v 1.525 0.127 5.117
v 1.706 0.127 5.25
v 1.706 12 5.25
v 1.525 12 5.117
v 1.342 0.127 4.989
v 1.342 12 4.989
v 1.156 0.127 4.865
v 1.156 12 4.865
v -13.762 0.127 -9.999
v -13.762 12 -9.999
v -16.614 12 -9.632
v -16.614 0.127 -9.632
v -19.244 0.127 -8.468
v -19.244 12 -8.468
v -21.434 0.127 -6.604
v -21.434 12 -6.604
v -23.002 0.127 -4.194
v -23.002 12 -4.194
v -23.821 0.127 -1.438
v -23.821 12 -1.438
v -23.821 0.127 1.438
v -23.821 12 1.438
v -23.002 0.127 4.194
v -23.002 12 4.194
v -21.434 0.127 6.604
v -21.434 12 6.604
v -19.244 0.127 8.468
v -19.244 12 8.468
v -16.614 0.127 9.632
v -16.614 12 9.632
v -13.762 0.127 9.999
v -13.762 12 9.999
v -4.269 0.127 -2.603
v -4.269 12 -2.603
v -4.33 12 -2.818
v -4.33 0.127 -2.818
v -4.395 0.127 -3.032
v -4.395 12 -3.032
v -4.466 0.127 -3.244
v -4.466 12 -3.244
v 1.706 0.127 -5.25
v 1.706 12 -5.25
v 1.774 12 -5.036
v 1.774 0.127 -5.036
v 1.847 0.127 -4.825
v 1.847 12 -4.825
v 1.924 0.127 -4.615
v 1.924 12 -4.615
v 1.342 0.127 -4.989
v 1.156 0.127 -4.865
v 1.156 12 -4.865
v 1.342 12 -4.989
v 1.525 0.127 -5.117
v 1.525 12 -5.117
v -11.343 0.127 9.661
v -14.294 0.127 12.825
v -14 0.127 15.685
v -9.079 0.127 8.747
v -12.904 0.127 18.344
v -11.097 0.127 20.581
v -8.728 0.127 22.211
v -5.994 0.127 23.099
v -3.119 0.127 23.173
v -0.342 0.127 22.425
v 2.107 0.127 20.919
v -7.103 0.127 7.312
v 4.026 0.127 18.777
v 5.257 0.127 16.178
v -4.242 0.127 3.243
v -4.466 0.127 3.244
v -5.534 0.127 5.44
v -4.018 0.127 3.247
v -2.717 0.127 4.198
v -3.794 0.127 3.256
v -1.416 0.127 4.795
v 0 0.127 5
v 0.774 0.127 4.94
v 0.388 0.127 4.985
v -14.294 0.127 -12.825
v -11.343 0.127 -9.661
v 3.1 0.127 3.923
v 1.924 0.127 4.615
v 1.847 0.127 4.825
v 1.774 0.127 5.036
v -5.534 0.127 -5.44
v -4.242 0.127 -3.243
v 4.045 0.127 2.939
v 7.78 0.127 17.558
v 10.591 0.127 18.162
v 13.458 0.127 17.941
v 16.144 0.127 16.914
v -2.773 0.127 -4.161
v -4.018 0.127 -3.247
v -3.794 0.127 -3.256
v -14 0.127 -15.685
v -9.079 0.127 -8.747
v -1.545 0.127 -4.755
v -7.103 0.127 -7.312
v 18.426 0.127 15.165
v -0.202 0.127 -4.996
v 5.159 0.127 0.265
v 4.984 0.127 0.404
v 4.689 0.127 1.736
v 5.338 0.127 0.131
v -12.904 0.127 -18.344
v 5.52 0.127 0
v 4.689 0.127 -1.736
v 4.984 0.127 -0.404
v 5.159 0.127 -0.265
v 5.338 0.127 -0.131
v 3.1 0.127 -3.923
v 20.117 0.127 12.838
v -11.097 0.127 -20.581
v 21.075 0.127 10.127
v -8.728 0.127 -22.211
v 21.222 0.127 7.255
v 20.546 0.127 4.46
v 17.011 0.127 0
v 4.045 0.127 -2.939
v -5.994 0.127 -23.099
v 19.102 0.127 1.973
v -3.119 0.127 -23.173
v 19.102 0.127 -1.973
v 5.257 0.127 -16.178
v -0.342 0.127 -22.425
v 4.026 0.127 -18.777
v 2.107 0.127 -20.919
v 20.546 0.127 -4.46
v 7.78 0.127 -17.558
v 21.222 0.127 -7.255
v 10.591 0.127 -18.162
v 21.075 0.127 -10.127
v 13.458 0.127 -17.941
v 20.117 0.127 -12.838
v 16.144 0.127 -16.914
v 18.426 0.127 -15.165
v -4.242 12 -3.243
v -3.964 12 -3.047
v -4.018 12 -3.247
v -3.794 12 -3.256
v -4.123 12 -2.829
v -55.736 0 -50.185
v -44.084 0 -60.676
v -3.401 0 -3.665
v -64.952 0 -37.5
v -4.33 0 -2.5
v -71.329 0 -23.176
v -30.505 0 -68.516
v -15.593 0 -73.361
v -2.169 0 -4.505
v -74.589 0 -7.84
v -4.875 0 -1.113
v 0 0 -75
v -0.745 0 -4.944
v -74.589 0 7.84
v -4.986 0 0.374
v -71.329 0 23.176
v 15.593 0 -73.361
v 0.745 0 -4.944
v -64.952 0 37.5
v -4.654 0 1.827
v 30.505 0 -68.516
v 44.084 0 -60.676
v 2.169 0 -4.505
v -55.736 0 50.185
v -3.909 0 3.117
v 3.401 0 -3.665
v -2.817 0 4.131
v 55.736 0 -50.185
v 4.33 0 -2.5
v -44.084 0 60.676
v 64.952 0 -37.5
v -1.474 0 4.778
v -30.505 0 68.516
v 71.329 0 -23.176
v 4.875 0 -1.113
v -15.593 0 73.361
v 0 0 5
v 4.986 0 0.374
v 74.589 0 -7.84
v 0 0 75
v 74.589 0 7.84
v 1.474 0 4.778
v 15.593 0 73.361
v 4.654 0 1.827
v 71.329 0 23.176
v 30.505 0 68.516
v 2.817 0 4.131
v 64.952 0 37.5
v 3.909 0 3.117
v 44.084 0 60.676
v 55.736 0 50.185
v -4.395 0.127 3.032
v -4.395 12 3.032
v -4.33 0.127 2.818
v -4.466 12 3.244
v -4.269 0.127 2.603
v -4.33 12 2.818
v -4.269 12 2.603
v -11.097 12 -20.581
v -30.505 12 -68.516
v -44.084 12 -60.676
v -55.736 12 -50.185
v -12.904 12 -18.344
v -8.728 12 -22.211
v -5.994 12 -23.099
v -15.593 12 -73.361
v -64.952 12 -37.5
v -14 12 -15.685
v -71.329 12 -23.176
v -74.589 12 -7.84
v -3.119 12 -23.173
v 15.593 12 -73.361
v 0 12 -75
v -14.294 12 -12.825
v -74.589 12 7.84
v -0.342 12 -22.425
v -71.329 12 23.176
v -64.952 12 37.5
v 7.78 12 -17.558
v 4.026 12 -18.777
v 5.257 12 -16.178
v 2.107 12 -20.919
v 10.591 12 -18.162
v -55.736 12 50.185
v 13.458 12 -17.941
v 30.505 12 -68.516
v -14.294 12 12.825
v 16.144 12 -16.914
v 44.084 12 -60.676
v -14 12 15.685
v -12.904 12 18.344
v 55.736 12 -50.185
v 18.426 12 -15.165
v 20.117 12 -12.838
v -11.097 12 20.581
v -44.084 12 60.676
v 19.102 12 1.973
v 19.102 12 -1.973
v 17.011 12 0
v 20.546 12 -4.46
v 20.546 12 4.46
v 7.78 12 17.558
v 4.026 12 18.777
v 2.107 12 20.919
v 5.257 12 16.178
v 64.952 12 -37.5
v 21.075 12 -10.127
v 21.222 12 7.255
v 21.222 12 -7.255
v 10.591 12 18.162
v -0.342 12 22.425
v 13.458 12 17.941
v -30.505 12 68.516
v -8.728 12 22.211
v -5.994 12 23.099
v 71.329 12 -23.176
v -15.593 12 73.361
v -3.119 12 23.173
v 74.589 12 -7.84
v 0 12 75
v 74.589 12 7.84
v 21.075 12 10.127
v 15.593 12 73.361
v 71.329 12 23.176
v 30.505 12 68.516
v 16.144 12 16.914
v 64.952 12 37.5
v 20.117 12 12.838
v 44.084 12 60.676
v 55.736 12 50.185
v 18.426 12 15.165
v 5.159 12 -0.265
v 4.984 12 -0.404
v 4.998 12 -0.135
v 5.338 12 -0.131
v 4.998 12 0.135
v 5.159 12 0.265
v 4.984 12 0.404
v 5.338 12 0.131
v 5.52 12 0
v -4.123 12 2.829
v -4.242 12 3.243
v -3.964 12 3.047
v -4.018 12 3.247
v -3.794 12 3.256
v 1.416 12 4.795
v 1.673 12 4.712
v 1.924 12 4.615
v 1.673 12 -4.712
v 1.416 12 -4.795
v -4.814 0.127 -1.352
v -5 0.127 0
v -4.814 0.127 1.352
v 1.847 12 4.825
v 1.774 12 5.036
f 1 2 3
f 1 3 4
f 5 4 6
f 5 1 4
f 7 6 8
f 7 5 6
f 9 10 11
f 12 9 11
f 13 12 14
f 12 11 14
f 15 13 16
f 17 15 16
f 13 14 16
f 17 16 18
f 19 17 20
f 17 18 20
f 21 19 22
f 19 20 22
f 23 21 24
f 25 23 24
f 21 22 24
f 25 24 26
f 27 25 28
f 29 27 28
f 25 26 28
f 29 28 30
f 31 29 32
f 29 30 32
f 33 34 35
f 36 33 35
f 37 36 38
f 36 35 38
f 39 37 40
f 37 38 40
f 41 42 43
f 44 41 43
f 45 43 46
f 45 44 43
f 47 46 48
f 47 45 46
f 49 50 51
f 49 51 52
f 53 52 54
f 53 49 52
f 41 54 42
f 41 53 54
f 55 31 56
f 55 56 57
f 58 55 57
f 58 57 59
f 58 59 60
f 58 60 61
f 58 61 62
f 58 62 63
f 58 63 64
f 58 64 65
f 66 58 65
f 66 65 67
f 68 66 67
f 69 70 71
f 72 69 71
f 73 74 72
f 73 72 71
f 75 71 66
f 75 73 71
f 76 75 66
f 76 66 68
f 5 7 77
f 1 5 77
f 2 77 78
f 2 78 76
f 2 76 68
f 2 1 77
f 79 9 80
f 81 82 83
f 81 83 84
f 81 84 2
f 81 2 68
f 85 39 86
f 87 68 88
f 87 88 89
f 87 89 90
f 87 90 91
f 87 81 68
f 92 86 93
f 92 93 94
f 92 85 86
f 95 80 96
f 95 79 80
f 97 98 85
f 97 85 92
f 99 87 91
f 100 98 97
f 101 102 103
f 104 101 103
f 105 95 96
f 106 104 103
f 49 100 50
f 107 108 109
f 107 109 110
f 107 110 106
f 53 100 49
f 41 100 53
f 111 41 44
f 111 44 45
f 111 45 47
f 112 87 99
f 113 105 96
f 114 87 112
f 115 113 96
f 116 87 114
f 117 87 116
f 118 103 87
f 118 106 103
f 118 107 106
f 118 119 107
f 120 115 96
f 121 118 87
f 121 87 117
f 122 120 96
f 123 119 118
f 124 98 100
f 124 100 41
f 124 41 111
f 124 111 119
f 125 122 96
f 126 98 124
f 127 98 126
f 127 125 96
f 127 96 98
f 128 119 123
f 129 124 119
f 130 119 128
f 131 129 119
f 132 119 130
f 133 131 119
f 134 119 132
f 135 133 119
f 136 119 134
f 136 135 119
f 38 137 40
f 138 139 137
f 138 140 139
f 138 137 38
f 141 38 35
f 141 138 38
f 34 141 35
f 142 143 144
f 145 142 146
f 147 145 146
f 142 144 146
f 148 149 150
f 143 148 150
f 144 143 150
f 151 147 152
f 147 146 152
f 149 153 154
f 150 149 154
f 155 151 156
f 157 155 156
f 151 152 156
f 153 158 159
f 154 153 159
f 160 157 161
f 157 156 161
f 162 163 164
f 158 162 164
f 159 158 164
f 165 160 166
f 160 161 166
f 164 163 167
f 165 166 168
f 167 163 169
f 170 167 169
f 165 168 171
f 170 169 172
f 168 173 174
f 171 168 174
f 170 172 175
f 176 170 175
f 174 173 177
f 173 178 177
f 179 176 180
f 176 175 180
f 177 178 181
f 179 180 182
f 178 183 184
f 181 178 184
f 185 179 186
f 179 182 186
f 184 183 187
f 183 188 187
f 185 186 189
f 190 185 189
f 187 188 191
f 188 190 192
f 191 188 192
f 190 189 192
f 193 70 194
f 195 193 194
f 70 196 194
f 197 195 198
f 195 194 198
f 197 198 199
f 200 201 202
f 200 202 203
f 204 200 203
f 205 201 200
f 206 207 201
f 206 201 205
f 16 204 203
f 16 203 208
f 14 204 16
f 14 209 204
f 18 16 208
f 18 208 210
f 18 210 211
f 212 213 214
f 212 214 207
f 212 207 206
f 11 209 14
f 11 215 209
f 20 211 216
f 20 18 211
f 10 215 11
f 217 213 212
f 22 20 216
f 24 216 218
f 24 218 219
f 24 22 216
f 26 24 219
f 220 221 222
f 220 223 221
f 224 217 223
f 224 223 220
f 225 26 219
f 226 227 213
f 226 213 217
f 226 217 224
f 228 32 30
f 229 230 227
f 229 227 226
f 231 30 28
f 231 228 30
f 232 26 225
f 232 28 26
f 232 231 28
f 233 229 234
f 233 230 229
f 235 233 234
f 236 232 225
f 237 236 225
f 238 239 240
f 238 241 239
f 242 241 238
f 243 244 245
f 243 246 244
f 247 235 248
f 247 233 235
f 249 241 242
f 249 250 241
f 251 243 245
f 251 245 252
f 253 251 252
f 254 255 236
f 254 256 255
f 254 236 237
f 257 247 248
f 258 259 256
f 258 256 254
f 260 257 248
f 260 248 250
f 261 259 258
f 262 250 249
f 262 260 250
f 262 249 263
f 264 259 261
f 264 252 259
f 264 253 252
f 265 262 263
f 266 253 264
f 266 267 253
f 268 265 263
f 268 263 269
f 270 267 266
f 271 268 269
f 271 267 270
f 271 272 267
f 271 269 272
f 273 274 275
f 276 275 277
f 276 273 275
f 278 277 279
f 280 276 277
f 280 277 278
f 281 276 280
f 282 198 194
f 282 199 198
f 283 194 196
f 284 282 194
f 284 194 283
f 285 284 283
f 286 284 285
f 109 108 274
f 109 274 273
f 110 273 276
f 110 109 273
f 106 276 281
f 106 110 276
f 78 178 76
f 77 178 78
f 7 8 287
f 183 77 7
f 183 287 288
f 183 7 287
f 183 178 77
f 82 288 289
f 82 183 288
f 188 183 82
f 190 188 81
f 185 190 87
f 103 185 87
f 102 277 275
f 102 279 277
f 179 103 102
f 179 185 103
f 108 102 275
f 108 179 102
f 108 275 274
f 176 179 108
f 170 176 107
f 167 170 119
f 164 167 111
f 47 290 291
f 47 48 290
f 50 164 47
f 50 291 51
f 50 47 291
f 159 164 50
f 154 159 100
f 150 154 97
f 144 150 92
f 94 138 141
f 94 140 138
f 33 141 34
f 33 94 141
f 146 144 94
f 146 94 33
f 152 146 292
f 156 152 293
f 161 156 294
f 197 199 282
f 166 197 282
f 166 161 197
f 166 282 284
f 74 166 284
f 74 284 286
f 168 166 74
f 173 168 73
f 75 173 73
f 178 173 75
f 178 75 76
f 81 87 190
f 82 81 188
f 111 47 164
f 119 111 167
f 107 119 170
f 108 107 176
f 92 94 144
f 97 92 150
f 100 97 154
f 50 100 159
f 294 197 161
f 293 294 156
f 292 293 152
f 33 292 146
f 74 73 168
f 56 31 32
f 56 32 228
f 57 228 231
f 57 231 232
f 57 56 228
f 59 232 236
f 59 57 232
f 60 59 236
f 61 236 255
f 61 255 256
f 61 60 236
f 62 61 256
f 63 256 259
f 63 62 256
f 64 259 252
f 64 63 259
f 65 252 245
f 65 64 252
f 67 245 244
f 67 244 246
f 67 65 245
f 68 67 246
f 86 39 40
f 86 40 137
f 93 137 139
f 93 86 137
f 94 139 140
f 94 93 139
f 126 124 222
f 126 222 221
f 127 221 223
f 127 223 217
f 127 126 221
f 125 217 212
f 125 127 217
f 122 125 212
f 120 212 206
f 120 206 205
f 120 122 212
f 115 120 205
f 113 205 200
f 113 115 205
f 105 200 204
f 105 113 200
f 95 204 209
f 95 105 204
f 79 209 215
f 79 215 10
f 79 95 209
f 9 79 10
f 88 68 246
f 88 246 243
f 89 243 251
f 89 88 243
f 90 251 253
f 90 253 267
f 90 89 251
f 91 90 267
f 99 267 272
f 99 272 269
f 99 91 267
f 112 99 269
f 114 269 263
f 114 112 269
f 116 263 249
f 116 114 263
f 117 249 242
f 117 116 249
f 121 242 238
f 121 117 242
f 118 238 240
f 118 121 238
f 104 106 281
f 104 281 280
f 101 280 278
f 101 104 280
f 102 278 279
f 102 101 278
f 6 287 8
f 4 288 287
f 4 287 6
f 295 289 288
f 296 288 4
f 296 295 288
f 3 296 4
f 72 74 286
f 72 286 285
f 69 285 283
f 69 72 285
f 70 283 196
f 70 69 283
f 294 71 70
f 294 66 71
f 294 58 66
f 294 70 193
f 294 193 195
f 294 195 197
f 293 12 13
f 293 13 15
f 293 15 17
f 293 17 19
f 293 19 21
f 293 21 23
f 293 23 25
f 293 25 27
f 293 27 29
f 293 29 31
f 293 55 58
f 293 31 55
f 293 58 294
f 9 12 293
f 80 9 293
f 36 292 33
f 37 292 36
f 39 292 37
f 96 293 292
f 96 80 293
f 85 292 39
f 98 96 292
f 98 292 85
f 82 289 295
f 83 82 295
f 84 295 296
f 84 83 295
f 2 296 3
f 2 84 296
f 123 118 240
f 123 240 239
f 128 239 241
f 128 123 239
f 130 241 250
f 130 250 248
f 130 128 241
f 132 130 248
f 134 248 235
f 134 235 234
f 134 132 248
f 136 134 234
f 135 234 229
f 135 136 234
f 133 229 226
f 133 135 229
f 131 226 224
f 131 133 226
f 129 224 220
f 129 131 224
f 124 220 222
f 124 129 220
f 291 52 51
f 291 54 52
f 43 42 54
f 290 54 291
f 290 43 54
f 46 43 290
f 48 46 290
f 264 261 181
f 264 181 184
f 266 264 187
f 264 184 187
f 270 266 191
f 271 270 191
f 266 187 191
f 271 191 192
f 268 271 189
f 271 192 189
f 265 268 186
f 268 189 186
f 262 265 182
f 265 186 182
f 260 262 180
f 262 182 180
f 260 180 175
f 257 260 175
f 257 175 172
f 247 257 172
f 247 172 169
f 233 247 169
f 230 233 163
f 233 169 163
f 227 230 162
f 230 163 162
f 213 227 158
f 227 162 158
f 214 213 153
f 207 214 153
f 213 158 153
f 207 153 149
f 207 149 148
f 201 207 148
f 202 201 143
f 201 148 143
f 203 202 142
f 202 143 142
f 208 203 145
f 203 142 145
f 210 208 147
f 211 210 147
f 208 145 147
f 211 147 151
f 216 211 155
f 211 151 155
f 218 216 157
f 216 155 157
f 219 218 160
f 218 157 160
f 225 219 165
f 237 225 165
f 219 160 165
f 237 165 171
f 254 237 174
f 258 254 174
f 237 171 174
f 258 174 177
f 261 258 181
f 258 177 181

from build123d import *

# Parameters (mm, degrees)
SKETCH1_R           = 75
BOSS_EXTRUDE1_DEPTH = 12
SKETCH2_R           = 5
CUT_EXTRUDE1_DEPTH  = 107.742681248
SKETCH3_R           = 10
CUT_EXTRUDE2_DEPTH  = 11.87311686
CIRPATTERN1_COUNT   = 5


with BuildPart() as part:
    # Sketch1 → Boss-Extrude1 (new body)
    with BuildSketch(Plane(origin=(0, 0, 0), x_dir=(1, 0, 0), z_dir=(0, 1, 0))):
        Circle(SKETCH1_R)
    extrude(amount=BOSS_EXTRUDE1_DEPTH)

    # Sketch2 → Cut-Extrude1 (cut, through all)
    with BuildSketch(Plane(origin=(0, 0, 0), x_dir=(1, 0, 0), z_dir=(0, 1, 0))):
        Circle(SKETCH2_R)
    extrude(amount=CUT_EXTRUDE1_DEPTH, mode=Mode.SUBTRACT)

    # Sketch3 → Cut-Extrude2 (cut)
    with BuildSketch(Plane(origin=(0, 12, 0), x_dir=(1, 0, 0), z_dir=(0, 1, 0))):
        with Locations((-13.924696634, 0)):
            Circle(SKETCH3_R)
    cut_extrude2 = extrude(amount=-CUT_EXTRUDE2_DEPTH, mode=Mode.SUBTRACT)

    # CirPattern1: Cut-Extrude2 ×5 about axis
    cirpattern1_axis = Axis((0, 0, 0), (0, 1, 0))
    for i in range(1, CIRPATTERN1_COUNT):
        add(cut_extrude2.rotate(cirpattern1_axis, i * 360 / CIRPATTERN1_COUNT), mode=Mode.SUBTRACT)


solid = part.part
